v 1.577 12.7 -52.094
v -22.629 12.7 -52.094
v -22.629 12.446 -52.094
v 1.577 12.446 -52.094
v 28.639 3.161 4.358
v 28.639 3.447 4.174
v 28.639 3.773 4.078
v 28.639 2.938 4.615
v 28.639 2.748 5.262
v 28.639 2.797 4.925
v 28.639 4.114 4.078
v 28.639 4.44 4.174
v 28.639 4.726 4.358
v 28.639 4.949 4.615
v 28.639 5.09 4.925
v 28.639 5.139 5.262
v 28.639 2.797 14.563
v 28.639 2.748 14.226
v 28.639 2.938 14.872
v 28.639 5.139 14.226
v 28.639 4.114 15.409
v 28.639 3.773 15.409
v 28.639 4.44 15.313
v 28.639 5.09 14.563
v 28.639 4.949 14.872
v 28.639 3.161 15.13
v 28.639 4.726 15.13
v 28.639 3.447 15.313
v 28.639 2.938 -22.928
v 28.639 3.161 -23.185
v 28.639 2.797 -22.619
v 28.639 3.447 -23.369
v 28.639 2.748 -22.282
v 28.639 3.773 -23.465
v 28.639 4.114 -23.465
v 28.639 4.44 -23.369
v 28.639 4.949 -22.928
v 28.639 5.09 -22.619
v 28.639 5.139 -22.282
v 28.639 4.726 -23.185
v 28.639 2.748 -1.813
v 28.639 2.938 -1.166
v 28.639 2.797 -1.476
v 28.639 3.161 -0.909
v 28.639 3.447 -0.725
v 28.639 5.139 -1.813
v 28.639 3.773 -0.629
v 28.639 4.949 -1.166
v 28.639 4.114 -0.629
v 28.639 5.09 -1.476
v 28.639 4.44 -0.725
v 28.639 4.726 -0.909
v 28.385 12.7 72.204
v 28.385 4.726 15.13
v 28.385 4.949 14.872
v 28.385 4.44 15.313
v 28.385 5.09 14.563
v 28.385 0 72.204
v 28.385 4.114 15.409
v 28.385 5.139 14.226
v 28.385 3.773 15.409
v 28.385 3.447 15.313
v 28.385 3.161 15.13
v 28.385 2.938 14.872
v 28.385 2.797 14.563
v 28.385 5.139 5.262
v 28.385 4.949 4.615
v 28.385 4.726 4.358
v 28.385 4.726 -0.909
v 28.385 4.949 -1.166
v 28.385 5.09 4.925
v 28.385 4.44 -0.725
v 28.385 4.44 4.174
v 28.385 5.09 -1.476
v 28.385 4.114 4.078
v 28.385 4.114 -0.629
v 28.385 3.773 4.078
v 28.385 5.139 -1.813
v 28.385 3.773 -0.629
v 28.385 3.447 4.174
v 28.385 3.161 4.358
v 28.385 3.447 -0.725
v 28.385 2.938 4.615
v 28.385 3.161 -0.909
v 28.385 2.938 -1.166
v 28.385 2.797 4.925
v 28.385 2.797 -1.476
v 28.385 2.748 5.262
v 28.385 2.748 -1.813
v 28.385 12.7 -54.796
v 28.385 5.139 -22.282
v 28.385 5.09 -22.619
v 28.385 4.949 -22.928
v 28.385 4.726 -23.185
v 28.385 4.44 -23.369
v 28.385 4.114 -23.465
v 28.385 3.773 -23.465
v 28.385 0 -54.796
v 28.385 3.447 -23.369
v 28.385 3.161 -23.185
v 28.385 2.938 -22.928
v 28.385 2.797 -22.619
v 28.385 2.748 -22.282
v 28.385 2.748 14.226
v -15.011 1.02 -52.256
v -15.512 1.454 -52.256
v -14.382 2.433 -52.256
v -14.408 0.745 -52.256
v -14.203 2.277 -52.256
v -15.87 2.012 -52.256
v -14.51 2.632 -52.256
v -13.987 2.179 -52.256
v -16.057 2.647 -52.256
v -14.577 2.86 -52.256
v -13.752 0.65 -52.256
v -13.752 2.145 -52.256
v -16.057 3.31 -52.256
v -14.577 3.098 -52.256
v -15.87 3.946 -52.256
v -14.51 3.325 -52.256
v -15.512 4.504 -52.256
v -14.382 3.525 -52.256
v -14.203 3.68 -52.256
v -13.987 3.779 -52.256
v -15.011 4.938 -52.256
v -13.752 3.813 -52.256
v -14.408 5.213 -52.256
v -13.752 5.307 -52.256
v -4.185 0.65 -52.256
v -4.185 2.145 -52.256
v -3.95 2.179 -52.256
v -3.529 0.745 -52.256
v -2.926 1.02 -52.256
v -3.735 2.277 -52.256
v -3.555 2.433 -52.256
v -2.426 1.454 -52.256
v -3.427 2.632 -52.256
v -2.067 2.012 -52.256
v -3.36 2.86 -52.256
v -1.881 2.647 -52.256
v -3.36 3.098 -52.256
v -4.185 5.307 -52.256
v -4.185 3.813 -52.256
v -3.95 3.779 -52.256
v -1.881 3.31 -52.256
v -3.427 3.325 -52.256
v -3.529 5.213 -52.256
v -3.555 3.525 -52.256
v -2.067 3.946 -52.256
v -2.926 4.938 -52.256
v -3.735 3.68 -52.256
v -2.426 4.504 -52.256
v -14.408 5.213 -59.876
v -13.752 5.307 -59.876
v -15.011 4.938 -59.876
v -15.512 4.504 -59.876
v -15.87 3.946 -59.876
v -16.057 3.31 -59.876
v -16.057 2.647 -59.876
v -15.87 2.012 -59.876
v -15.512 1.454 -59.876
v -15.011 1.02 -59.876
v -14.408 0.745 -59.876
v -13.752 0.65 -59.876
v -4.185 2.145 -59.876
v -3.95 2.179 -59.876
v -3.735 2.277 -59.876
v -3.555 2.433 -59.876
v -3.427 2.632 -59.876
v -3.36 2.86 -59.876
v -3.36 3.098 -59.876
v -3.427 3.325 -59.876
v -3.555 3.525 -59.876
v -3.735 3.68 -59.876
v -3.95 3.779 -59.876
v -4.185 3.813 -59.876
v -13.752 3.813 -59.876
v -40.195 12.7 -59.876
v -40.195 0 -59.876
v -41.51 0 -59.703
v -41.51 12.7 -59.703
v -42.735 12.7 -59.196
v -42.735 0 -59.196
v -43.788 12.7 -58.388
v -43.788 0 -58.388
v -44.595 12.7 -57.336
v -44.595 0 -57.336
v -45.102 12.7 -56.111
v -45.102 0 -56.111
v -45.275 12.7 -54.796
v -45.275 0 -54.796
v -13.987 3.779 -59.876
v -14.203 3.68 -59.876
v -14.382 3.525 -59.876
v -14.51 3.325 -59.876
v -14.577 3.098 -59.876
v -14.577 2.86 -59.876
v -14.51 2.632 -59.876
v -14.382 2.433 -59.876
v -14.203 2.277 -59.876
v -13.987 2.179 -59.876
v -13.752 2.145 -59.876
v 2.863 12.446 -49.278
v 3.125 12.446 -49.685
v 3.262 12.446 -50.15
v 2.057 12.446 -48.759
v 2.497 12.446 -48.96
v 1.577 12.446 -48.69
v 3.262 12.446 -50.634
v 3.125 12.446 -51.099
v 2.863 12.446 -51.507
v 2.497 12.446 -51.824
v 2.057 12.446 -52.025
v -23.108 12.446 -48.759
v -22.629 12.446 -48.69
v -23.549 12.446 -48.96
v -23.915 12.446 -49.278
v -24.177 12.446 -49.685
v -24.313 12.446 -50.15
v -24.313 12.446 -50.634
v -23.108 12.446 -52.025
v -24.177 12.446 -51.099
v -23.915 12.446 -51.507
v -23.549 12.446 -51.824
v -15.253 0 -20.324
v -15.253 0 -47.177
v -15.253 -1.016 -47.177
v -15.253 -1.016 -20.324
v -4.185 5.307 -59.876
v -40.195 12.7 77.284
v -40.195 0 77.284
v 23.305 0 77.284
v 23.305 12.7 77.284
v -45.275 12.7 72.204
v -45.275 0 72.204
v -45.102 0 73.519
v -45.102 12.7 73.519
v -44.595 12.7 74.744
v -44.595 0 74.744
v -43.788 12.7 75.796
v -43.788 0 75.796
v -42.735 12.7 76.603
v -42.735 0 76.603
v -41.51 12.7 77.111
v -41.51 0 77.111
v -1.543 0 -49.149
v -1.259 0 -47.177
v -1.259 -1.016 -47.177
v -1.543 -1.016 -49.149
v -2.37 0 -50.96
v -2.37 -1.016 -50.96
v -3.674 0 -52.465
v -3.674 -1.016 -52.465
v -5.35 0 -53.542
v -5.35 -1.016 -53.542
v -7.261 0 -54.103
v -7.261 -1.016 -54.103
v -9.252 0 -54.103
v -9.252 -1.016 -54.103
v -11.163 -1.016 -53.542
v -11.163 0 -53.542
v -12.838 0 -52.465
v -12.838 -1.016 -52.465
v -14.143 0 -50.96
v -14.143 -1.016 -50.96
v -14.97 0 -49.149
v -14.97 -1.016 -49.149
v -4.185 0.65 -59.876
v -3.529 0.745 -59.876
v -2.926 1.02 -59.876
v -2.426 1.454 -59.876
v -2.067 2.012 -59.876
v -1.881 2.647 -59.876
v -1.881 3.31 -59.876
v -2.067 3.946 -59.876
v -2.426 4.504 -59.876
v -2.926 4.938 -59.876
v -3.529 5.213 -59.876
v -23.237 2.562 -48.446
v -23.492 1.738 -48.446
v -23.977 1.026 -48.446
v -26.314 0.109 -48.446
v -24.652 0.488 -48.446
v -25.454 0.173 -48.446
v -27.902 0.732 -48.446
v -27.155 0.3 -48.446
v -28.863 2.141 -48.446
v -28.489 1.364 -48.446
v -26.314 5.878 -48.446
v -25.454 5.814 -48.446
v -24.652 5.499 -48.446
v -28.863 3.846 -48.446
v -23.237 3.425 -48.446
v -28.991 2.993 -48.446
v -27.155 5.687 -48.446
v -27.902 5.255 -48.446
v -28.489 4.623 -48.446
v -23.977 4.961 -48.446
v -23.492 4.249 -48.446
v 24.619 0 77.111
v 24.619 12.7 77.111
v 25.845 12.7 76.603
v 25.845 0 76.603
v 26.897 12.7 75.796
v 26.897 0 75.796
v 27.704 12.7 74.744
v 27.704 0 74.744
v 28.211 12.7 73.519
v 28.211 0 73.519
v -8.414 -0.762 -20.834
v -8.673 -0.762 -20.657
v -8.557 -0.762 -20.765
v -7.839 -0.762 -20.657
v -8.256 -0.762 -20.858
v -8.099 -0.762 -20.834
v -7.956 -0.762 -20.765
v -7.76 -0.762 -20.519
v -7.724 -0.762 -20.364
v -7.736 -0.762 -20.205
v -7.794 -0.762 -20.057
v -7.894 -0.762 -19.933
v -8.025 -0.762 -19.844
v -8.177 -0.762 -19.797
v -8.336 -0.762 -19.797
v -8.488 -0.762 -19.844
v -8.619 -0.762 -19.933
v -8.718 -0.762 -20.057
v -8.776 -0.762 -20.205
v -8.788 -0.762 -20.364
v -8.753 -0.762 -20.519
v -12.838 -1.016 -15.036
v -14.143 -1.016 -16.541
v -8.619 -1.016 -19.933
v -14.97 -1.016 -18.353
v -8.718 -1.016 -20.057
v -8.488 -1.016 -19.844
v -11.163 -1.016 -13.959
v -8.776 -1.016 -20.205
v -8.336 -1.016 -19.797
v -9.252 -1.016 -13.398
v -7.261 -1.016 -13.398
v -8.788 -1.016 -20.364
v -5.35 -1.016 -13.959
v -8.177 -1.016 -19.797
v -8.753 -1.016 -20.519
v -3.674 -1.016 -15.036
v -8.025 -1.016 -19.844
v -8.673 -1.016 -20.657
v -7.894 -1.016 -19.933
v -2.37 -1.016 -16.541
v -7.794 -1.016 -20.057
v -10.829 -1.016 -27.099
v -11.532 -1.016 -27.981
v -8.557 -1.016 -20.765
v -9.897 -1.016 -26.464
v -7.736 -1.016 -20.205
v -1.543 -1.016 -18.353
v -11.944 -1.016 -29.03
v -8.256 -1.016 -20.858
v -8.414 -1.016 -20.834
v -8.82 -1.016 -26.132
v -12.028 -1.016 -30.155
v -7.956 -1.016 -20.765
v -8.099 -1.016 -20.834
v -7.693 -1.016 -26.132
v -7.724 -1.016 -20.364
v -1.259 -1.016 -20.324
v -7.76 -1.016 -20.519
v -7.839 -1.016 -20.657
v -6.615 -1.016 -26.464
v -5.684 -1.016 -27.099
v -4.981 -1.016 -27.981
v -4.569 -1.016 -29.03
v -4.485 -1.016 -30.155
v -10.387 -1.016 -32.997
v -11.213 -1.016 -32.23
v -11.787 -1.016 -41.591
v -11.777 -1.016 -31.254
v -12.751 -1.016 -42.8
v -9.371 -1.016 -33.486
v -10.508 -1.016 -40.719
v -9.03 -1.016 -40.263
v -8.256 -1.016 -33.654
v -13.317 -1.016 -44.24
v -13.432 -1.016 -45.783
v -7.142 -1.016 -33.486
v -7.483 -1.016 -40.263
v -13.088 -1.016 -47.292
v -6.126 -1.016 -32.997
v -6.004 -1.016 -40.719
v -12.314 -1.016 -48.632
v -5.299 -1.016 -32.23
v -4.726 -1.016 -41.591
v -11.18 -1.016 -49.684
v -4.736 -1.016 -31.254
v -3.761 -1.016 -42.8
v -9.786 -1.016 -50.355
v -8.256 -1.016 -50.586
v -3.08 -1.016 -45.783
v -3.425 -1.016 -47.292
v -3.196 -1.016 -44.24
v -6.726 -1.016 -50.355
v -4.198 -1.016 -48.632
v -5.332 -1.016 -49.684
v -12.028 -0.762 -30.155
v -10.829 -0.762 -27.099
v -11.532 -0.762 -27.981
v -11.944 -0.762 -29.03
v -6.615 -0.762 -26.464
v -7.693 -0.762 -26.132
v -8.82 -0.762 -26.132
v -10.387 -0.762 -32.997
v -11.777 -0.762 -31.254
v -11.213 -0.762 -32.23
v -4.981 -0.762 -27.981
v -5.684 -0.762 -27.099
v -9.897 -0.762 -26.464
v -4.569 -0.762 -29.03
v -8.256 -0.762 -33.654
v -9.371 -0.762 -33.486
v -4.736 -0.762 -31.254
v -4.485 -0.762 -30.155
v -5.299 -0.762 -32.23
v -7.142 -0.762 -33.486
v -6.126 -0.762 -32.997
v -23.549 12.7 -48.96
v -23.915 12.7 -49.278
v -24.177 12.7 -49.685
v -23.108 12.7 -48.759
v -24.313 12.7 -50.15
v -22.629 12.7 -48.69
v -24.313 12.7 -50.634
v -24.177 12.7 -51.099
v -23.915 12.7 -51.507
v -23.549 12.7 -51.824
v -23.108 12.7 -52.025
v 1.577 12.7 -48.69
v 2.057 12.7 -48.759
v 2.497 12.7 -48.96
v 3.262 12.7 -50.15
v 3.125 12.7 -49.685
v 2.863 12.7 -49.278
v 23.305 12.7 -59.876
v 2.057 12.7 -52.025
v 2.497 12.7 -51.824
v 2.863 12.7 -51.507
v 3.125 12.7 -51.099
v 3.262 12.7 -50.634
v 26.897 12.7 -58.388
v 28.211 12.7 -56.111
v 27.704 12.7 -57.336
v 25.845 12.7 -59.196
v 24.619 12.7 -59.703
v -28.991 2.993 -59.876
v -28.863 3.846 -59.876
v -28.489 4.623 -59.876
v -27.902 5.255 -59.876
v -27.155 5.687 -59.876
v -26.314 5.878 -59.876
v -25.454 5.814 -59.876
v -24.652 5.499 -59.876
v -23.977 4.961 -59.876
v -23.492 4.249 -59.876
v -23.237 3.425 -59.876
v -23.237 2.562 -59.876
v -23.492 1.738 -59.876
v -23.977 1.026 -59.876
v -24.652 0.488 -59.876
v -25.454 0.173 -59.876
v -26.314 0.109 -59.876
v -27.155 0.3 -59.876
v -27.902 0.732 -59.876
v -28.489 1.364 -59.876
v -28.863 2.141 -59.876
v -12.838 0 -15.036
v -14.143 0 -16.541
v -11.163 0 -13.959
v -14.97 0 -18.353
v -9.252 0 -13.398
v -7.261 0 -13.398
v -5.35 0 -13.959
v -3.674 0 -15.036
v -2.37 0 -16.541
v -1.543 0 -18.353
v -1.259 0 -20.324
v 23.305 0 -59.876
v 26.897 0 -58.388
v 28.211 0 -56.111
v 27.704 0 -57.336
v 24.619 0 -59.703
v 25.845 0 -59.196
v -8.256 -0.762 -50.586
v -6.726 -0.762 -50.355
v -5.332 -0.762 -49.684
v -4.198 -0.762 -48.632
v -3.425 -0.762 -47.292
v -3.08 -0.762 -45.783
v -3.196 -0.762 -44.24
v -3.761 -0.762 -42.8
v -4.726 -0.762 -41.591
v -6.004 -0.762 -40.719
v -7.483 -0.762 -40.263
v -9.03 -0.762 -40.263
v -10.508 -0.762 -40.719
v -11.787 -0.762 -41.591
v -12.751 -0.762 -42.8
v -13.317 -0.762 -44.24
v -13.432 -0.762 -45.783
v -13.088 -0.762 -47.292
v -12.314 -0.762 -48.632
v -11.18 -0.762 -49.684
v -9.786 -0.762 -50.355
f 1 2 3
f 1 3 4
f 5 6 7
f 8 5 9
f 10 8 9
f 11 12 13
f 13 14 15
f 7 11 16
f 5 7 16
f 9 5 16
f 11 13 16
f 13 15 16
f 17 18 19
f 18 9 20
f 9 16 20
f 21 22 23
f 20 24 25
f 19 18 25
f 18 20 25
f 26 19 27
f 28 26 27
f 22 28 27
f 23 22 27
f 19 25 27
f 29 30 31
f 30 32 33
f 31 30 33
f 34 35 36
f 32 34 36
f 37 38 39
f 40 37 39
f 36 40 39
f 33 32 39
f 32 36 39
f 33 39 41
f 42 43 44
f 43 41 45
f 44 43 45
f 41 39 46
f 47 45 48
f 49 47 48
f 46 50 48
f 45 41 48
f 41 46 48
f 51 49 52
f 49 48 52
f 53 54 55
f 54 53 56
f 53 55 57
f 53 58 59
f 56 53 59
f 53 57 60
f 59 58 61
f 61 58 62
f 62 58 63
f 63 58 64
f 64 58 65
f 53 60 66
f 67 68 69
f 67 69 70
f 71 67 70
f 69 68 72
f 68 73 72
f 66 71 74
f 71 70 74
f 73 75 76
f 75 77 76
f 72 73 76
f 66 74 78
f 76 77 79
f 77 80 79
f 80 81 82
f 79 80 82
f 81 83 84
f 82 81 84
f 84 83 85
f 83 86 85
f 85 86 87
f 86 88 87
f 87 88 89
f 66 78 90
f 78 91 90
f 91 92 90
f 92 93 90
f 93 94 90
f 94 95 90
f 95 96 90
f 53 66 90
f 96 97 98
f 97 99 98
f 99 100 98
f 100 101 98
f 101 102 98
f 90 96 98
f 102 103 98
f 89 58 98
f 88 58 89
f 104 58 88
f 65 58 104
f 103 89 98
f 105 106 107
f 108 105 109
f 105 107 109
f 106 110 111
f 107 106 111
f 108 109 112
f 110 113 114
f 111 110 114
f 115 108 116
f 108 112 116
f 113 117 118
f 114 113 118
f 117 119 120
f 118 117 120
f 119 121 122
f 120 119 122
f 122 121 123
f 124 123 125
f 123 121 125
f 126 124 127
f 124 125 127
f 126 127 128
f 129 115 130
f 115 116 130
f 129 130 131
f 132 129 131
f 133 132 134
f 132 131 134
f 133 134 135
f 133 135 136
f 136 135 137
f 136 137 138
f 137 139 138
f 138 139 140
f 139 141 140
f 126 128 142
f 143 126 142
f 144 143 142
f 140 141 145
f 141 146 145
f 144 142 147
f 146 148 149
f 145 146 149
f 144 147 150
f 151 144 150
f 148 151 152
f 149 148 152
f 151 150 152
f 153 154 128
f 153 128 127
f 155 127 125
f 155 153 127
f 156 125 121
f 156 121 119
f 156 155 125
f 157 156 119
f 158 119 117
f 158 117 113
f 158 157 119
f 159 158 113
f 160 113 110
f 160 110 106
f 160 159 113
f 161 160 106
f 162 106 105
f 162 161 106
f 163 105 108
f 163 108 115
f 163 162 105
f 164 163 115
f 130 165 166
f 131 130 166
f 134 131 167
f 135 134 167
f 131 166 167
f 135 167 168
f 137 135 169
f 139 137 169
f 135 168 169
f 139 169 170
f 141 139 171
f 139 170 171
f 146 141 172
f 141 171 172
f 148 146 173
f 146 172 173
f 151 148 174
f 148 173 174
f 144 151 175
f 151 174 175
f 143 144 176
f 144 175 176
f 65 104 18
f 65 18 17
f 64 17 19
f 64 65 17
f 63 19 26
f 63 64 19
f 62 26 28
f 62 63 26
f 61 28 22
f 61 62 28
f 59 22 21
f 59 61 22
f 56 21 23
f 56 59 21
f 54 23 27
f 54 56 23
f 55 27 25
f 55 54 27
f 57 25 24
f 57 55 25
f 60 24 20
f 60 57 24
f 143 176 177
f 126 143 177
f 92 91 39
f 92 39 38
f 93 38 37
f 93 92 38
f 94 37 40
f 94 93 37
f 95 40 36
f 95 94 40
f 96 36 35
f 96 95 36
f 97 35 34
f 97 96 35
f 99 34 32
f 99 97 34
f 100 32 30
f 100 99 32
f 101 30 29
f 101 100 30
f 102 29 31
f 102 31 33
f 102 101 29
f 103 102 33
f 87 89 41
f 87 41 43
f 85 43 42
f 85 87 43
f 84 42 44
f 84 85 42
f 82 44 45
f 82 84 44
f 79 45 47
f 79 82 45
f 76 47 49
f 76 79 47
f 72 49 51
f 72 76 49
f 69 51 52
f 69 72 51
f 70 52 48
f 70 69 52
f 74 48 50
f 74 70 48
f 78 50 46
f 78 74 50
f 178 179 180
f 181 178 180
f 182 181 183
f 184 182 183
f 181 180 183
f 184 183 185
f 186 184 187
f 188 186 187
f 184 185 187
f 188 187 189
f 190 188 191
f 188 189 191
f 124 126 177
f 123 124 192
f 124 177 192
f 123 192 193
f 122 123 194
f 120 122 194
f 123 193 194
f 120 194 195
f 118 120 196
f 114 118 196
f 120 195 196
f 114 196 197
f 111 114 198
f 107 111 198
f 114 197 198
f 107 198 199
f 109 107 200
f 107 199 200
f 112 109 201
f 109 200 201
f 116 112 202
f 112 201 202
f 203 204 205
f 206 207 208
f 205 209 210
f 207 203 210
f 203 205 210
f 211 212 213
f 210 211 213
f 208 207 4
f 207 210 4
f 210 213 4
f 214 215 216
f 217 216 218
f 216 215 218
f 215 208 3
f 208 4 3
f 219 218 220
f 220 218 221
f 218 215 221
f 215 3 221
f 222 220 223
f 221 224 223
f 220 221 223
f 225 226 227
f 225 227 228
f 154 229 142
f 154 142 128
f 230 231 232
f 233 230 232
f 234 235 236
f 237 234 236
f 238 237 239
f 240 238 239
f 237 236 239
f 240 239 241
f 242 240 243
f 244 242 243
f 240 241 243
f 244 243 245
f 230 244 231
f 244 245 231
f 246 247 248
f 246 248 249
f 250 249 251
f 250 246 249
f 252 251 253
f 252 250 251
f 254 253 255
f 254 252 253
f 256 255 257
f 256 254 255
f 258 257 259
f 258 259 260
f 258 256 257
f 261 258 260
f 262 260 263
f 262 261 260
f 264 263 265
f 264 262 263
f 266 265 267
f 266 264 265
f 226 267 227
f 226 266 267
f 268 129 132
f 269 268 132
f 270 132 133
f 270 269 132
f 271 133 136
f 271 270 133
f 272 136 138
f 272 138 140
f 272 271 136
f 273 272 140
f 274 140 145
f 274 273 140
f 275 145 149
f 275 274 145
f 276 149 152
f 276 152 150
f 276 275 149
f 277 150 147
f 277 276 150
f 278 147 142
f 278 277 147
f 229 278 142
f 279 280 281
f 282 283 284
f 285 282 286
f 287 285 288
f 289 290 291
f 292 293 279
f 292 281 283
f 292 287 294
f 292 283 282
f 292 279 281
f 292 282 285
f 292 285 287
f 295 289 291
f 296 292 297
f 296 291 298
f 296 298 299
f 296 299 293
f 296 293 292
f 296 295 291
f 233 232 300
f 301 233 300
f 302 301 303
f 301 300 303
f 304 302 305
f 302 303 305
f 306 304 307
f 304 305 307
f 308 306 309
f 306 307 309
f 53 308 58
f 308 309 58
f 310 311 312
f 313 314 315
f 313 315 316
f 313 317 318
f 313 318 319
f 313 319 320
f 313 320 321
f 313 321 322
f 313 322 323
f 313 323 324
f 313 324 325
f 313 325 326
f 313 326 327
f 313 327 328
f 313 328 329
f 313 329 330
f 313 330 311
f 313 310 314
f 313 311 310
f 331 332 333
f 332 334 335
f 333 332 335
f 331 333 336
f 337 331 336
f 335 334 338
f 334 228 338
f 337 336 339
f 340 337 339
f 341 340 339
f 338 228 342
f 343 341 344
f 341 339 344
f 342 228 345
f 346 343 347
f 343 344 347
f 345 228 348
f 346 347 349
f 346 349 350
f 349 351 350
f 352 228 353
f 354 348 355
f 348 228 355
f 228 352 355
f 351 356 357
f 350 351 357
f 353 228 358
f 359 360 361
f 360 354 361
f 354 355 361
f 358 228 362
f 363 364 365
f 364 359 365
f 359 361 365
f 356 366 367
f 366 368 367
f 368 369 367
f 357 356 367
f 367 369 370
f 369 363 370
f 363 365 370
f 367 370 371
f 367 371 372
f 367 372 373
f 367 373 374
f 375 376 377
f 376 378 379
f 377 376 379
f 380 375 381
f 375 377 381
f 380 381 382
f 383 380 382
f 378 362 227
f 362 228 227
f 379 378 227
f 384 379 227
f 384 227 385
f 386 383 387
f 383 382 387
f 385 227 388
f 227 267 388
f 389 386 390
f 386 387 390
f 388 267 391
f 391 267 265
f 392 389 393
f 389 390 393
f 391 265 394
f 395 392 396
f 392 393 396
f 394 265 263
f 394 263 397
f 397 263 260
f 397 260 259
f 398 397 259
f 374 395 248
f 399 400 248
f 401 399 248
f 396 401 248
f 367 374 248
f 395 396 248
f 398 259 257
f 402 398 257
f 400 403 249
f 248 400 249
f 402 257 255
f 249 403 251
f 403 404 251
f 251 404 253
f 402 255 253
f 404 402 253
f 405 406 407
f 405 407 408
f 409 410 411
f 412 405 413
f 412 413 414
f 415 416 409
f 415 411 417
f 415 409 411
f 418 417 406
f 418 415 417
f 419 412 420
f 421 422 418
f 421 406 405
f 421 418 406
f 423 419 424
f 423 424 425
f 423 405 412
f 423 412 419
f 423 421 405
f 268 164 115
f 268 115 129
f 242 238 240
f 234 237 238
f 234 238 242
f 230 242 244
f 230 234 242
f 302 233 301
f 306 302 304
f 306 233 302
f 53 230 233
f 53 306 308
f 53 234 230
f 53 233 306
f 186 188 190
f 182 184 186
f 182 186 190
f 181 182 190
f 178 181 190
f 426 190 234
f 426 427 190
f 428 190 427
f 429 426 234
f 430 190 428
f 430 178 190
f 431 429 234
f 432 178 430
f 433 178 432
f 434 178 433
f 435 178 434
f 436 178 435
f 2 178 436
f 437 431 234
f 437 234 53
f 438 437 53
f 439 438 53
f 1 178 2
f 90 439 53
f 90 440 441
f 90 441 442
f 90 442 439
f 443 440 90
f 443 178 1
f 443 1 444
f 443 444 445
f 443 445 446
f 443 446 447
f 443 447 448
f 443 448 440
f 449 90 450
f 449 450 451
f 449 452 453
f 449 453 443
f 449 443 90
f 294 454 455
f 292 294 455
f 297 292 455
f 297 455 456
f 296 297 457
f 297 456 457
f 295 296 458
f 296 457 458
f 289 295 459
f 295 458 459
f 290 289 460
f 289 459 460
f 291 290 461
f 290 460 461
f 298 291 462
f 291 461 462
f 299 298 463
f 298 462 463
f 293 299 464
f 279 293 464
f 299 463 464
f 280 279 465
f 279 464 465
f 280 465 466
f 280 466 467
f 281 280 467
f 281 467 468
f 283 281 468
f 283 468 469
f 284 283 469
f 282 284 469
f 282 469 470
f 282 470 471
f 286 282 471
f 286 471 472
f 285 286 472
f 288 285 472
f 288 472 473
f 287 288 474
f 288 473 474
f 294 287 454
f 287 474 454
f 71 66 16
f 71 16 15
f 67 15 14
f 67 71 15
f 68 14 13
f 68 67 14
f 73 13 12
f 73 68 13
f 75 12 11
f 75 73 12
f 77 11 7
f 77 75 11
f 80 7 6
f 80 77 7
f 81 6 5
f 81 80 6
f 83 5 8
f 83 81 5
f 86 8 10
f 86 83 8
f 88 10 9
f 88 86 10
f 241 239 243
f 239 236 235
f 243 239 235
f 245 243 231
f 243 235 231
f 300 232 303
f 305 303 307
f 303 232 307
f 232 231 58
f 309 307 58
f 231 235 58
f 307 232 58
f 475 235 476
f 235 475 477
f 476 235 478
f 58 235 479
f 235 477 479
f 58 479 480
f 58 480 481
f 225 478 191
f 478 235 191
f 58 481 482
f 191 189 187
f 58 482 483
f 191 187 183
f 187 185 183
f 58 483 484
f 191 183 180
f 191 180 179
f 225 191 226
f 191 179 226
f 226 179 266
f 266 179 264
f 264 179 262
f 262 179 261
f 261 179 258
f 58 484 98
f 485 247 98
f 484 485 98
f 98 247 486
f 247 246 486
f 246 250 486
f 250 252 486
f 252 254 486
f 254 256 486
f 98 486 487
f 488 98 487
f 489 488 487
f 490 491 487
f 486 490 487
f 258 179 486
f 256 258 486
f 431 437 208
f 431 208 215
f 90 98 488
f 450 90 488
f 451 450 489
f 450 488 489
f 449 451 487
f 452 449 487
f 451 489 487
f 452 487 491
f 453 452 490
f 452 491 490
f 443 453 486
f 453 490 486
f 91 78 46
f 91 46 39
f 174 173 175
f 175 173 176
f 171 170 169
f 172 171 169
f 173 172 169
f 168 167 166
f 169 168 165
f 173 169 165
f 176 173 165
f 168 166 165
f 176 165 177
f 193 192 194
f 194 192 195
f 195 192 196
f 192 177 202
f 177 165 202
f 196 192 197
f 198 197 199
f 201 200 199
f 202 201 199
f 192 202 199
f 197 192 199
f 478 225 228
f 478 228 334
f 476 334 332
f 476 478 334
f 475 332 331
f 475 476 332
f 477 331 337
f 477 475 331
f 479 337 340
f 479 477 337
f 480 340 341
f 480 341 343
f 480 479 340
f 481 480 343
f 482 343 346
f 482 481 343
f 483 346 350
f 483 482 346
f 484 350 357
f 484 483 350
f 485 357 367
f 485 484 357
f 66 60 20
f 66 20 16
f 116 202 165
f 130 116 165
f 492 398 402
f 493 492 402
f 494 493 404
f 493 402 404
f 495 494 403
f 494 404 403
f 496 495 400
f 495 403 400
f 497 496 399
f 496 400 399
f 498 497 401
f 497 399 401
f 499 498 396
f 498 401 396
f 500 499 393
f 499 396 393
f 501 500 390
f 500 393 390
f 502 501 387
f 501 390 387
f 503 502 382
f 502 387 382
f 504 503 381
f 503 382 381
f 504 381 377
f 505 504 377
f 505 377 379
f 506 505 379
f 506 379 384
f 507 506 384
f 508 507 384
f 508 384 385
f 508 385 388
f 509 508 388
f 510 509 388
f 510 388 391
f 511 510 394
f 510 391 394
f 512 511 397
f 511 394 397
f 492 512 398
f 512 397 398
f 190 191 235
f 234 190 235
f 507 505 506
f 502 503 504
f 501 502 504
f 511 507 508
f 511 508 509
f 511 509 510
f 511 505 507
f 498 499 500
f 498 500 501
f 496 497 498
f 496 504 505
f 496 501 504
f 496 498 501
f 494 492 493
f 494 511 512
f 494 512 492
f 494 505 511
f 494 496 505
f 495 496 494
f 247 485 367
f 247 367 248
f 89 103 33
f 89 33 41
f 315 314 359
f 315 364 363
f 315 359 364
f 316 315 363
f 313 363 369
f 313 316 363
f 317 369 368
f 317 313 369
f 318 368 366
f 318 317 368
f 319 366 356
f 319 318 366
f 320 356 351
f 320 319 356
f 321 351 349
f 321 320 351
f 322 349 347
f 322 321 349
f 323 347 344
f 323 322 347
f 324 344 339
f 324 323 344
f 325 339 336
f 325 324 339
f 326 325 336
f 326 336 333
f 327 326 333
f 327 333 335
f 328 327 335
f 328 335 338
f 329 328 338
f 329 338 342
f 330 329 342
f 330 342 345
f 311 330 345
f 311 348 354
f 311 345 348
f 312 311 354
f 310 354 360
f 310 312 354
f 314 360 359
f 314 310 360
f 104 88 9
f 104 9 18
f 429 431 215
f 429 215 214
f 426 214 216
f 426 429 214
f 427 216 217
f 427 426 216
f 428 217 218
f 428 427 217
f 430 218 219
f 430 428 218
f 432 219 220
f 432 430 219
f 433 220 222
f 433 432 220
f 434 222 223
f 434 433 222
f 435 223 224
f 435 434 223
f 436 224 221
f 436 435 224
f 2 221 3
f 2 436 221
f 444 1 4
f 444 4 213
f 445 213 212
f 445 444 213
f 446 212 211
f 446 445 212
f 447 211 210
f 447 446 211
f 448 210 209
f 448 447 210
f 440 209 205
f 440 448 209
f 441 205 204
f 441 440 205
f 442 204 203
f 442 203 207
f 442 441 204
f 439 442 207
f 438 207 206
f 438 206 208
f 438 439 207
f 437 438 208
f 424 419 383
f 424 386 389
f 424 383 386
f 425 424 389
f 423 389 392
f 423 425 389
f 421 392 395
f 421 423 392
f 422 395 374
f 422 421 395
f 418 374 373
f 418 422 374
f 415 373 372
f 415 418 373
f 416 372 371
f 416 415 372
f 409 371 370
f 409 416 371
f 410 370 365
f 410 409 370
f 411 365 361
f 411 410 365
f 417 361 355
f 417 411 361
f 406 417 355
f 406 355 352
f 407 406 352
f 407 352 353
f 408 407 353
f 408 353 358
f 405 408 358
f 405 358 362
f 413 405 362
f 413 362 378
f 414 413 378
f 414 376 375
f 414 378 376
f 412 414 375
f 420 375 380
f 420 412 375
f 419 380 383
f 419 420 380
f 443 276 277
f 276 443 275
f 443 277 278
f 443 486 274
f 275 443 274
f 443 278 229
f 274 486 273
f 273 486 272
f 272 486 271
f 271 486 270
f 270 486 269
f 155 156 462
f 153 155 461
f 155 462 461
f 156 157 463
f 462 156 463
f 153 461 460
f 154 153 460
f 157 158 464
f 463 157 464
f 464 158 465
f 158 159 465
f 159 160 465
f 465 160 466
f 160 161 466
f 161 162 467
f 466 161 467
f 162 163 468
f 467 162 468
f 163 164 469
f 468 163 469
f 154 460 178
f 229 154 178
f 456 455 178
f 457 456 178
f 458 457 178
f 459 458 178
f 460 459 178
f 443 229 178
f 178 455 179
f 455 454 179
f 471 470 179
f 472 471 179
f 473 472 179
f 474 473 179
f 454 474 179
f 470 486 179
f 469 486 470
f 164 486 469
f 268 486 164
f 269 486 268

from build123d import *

# Parameters (mm, degrees)
BOSS_EXTRUDE1_DEPTH     = 12.7
BOSS_EXTRUDE2_DEPTH     = 1.016
CUT_EXTRUDE2_DEPTH      = 0.254
CUT_EXTRUDE2_DEPTH_BACK = 0.254
SKETCH8_R               = 3.782150116
SKETCH8_R_2             = 0.533461952
SKETCH7_R               = 5.190476509
CUT_EXTRUDE3_DEPTH      = 0.254
CUT_EXTRUDE5_DEPTH      = 0.254
SKETCH13_R              = 2.893074104
CUT_EXTRUDE7_DEPTH      = 11.43
CUT_EXTRUDE8_DEPTH      = 7.62
BOSS_EXTRUDE3_DEPTH     = 0.254


with BuildPart() as part:
    # Sketch2 → Boss-Extrude1 (new body)
    with BuildSketch(Plane(origin=(0, 0, 0), x_dir=(1, 0, 0), z_dir=(0, 1, 0))):
        with BuildLine():
            Line((23.304511321, 59.876164022), (-40.195488679, 59.876164022))
            ThreePointArc((-40.195488679, 59.876164022), (-43.787591127, 58.388266471), (-45.275488679, 54.796164022))
            Line((-45.275488679, 54.796164022), (-45.275488679, -72.203835978))
            ThreePointArc((-45.275488679, -72.203835978), (-43.787591127, -75.795938426), (-40.195488679, -77.283835978))
            Line((-40.195488679, -77.283835978), (23.304511321, -77.283835978))
            ThreePointArc((23.304511321, -77.283835978), (26.89661377, -75.795938426), (28.384511321, -72.203835978))
            Line((28.384511321, -72.203835978), (28.384511321, 54.796164022))
            ThreePointArc((28.384511321, 54.796164022), (26.89661377, 58.388266471), (23.304511321, 59.876164022))
        make_face()
    extrude(amount=BOSS_EXTRUDE1_DEPTH)

    # Sketch5 → Boss-Extrude2 (add)
    with BuildSketch(Plane(origin=(0, 0, 0), x_dir=(-1, 0, 0), z_dir=(0, -1, 0))):
        with BuildLine():
            Line((1.259403459, 20.324166162), (1.259403459, 47.177431984))
            ThreePointArc((1.259403459, 47.177431984), (8.256381173, 54.174409699), (15.253358888, 47.177431984))
            Line((15.253358888, 47.177431984), (15.253358888, 20.324166162))
            ThreePointArc((15.253358888, 20.324166162), (8.256381173, 13.327188447), (1.259403459, 20.324166162))
        make_face()
    extrude(amount=BOSS_EXTRUDE2_DEPTH)

    # Sketch8 → Cut-Extrude2 (cut, two sides: drawn at the far end of the back side and taken through both)
    with BuildSketch(Plane(origin=(0, -1.016, 0), x_dir=(-1, 0, 0), z_dir=(0, -1, 0)).offset(-CUT_EXTRUDE2_DEPTH_BACK)):
        with Locations(Location((8.256381173, 29.871883473, 0), (0, 0, 90))):
            Circle(SKETCH8_R)
        with Locations(Location((8.256381173, 20.324166162, 0), (0, 0, 90))):
            Circle(SKETCH8_R_2)
    extrude(amount=CUT_EXTRUDE2_DEPTH + CUT_EXTRUDE2_DEPTH_BACK, mode=Mode.SUBTRACT)

    # Sketch7 → Cut-Extrude3 (cut)
    with BuildSketch(Plane(origin=(0, -1.016, 0), x_dir=(-1, 0, 0), z_dir=(0, -1, 0))):
        with Locations(Location((8.256381173, 45.395398439, 0), (0, 0, 90))):
            Circle(SKETCH7_R)
    extrude(amount=-CUT_EXTRUDE3_DEPTH, mode=Mode.SUBTRACT)

    # Sketch10 → Cut-Extrude5 (cut)
    with BuildSketch(Plane(origin=(0, 12.7, 0), x_dir=(1, 0, 0), z_dir=(0, 1, 0))):
        with BuildLine():
            Line((-22.628551613, 52.094227135), (1.577209128, 52.094227135))
            ThreePointArc((1.577209128, 52.094227135), (3.27917668, 50.392259583), (1.577209128, 48.690292031))
            Line((1.577209128, 48.690292031), (-22.628551613, 48.690292031))
            ThreePointArc((-22.628551613, 48.690292031), (-24.330519166, 50.392259583), (-22.628551613, 52.094227135))
        make_face()
    extrude(amount=-CUT_EXTRUDE5_DEPTH, mode=Mode.SUBTRACT)

    # Sketch13 → Cut-Extrude7 (cut)
    with BuildSketch(Plane(origin=(0, 0, -59.876164022), x_dir=(-1, 0, 0), z_dir=(0, 0, -1))):
        with Locations((26.098165184, 2.993499928)):
            Circle(SKETCH13_R)
    extrude(amount=-CUT_EXTRUDE7_DEPTH, mode=Mode.SUBTRACT)

    # Sketch14 → Cut-Extrude8 (cut)
    with BuildSketch(Plane(origin=(0, 0, -59.876164022), x_dir=(-1, 0, 0), z_dir=(0, 0, -1))):
        with BuildLine():
            Line((4.185340578, 5.307383364), (13.751795184, 5.307383364))
            ThreePointArc((13.751795184, 5.307383364), (16.080302046, 2.978876501), (13.751795184, 0.650369639))
            Line((13.751795184, 0.650369639), (4.185340578, 0.650369639))
            ThreePointArc((4.185340578, 0.650369639), (1.856833715, 2.978876501), (4.185340578, 5.307383364))
        make_face()
        with BuildLine():
            Line((4.185340578, 3.812772213), (13.751795184, 3.812772213))
            ThreePointArc((13.751795184, 3.812772213), (14.585690896, 2.978876501), (13.751795184, 2.144980789))
            Line((13.751795184, 2.144980789), (4.185340578, 2.144980789))
            ThreePointArc((4.185340578, 2.144980789), (3.351444866, 2.978876501), (4.185340578, 3.812772213))
        make_face(mode=Mode.SUBTRACT)
    extrude(amount=-CUT_EXTRUDE8_DEPTH, mode=Mode.SUBTRACT)

    # Sketch16 → Boss-Extrude3 (add)
    with BuildSketch(Plane(origin=(28.384511321, 0, 0), x_dir=(0, 0, -1), z_dir=(1, 0, 0))):
        with BuildLine():
            Line((1.812614233, 5.138816206), (22.282032337, 5.138816206))
            ThreePointArc((22.282032337, 5.138816206), (23.477323285, 3.943525258), (22.282032337, 2.748234309))
            Line((22.282032337, 2.748234309), (1.812614233, 2.748234309))
            ThreePointArc((1.812614233, 2.748234309), (0.617323285, 3.943525258), (1.812614233, 5.138816206))
        make_face()
        with BuildLine():
            Line((-14.226212683, 5.138811158), (-5.261520474, 5.138811158))
            ThreePointArc((-5.261520474, 5.138811158), (-4.066234574, 3.943525258), (-5.261520474, 2.748239358))
            Line((-5.261520474, 2.748239358), (-14.226212683, 2.748239358))
            ThreePointArc((-14.226212683, 2.748239358), (-15.421498583, 3.943525258), (-14.226212683, 5.138811158))
        make_face()
    extrude(amount=BOSS_EXTRUDE3_DEPTH)


solid = part.part
